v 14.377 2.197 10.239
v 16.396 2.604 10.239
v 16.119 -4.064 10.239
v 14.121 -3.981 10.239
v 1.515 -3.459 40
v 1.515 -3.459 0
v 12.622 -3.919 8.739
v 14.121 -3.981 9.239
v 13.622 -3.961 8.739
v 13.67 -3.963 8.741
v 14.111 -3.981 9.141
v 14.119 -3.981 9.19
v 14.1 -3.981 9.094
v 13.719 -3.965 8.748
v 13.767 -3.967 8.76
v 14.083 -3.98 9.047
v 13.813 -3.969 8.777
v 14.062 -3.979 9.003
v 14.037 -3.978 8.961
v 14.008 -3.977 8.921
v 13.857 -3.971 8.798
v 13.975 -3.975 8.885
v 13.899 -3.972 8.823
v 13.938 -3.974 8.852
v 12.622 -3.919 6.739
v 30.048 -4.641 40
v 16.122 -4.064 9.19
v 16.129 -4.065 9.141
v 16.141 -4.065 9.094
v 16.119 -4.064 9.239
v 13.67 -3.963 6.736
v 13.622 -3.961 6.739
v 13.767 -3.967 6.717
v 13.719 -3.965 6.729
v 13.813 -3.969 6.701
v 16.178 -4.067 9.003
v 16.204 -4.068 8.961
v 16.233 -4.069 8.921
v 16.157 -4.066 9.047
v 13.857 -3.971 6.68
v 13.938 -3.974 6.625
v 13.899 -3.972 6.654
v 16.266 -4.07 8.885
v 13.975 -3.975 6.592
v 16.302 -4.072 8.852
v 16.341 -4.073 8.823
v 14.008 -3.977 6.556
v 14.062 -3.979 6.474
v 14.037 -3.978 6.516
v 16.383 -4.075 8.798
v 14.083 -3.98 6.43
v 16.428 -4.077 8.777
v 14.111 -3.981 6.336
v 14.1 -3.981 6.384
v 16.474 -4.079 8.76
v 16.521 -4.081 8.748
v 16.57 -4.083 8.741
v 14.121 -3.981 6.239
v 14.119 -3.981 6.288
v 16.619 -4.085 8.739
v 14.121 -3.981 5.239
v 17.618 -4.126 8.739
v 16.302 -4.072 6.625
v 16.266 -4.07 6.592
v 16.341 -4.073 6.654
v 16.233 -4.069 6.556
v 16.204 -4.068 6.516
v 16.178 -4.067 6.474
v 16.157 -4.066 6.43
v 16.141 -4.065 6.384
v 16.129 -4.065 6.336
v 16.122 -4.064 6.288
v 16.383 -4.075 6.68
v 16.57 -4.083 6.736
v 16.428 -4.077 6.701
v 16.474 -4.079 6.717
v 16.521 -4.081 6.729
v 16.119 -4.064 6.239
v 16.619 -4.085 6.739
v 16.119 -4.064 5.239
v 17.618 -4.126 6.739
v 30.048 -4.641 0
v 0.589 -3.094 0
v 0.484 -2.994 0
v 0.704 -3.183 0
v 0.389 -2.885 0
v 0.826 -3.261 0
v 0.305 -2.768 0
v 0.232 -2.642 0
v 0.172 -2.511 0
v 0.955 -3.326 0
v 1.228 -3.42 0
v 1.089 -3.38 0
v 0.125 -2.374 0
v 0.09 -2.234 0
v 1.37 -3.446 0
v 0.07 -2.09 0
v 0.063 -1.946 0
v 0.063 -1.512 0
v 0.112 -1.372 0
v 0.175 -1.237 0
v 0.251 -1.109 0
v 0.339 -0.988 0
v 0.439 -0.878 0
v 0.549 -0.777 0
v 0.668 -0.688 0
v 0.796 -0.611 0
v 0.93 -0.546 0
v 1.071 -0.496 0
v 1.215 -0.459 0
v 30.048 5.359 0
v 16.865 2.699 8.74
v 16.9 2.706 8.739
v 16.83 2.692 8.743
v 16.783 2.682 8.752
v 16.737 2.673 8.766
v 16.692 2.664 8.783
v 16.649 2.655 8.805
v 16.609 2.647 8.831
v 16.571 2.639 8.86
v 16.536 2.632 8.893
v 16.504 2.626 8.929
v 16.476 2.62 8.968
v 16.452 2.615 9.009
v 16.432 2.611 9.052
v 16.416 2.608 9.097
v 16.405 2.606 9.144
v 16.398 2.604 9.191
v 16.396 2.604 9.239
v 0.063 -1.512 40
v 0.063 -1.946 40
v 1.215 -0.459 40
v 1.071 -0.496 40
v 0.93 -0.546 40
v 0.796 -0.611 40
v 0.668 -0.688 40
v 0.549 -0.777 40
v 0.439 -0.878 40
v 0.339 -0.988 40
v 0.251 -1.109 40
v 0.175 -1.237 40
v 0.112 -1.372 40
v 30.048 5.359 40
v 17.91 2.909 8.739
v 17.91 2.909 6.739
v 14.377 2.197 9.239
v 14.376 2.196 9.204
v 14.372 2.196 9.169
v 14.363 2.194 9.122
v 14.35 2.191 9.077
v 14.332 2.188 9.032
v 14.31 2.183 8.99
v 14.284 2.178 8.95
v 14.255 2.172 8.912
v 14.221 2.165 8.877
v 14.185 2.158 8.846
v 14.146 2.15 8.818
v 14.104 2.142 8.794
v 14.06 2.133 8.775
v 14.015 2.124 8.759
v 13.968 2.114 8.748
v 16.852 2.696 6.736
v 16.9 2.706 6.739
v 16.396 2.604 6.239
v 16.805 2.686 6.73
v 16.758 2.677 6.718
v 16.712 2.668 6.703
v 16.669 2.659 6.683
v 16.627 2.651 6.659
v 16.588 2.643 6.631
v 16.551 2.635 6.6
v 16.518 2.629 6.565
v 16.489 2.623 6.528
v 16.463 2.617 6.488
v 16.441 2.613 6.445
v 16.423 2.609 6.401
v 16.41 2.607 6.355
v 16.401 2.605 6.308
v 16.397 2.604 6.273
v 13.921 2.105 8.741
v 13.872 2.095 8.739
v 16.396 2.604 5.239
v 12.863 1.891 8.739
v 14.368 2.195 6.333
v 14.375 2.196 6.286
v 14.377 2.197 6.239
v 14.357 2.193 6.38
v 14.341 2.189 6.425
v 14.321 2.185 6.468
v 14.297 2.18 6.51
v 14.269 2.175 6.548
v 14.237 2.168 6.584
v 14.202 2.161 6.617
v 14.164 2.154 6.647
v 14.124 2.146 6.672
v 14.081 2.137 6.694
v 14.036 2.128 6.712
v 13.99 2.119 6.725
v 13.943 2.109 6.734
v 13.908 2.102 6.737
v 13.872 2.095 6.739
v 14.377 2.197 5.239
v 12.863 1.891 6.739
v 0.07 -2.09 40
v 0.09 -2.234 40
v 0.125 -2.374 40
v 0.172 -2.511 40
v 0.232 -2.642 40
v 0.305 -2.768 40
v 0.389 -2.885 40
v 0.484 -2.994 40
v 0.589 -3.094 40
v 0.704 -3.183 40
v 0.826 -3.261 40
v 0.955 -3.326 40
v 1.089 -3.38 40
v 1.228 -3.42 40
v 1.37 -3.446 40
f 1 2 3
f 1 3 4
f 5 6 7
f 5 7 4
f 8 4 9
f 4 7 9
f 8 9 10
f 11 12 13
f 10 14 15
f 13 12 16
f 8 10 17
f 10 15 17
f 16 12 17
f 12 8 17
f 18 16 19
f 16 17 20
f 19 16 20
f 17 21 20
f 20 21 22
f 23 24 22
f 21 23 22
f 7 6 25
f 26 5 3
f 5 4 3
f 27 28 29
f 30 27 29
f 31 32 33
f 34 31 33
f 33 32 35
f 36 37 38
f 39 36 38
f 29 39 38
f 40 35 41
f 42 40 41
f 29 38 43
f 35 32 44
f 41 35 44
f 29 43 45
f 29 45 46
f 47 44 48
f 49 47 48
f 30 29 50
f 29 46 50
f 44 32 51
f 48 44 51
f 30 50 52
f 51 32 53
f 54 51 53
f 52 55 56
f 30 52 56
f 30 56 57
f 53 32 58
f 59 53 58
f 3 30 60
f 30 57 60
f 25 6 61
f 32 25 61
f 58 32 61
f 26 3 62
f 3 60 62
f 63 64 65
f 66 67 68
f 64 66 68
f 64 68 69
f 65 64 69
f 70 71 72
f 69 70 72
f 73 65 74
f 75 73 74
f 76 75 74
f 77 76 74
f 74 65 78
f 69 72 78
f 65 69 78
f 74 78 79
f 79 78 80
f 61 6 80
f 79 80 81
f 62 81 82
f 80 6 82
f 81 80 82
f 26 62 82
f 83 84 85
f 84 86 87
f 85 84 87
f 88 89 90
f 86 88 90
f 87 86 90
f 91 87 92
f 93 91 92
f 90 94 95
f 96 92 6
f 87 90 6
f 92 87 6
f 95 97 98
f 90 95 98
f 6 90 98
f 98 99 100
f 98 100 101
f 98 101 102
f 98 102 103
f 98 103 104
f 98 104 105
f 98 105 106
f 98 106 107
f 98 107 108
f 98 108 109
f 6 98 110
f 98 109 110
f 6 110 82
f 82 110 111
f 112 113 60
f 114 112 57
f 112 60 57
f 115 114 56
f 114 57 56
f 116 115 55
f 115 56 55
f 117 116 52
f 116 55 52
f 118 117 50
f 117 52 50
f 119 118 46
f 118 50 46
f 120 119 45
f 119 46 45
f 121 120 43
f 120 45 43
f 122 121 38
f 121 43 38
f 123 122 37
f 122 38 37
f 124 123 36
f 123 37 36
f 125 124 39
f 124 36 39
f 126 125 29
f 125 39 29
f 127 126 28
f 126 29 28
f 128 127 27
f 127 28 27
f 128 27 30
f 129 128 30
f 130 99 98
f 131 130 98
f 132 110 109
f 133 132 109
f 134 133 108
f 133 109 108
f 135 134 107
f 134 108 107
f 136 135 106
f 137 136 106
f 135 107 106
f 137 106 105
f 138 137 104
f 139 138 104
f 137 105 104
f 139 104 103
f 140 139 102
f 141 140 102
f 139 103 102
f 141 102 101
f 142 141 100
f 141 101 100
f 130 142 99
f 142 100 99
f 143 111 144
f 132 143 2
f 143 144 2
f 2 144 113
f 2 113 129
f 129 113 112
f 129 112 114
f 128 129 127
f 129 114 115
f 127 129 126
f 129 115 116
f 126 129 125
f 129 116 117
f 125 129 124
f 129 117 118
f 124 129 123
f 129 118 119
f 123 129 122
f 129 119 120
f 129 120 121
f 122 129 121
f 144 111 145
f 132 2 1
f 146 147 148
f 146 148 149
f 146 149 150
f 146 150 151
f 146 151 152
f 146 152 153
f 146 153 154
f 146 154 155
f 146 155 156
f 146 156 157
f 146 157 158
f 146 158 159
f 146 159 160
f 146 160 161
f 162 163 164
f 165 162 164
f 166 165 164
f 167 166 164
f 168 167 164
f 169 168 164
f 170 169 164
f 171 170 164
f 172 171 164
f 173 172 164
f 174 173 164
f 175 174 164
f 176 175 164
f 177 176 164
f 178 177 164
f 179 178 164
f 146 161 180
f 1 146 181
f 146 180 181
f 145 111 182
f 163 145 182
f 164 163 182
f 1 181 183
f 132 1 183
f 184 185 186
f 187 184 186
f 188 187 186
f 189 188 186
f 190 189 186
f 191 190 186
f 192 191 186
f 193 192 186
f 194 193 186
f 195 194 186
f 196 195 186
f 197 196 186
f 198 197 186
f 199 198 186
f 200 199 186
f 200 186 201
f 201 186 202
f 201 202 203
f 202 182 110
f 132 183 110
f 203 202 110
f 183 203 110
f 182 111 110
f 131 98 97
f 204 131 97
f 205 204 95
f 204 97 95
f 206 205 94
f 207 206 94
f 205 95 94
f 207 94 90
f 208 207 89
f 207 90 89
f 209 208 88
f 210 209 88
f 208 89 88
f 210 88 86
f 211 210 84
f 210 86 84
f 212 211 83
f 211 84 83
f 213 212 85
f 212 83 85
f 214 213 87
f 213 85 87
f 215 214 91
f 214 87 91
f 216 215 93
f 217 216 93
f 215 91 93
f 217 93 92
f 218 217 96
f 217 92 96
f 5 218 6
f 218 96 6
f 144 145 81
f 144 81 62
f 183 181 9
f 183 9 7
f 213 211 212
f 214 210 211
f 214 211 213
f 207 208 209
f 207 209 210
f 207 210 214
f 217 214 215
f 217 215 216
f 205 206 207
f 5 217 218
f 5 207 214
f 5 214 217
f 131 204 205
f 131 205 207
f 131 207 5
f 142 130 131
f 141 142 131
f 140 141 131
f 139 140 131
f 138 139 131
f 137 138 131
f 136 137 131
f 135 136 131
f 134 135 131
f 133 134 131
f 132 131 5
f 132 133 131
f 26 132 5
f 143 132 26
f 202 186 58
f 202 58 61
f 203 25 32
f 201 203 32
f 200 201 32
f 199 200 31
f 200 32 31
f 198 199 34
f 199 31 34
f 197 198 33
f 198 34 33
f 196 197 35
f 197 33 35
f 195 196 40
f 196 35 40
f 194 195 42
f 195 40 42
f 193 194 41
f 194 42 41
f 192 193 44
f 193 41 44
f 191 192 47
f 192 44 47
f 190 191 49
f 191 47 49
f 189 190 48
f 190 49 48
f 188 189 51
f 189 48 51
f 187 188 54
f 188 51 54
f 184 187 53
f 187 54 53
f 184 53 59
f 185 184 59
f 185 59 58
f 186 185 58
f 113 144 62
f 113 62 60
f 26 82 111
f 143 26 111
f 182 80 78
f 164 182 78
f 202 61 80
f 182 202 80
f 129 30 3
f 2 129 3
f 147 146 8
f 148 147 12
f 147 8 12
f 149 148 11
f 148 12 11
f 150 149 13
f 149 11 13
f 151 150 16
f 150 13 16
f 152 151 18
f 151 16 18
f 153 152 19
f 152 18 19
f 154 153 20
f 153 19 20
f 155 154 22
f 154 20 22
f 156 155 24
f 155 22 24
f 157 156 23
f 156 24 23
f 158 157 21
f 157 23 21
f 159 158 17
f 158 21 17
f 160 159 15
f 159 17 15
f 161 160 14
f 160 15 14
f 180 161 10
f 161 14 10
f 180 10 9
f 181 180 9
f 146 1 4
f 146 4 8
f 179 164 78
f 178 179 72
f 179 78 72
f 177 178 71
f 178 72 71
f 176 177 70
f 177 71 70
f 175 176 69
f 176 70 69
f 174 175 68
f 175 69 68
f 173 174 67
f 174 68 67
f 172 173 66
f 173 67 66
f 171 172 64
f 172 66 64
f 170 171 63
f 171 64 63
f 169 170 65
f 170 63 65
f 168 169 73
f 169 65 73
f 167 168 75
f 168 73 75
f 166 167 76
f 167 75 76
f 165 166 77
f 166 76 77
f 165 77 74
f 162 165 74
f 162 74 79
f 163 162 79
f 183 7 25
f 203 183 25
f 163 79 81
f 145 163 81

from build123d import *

# Parameters (mm, degrees)
BOSS_EXTRUDE1_DEPTH = 40
CUT_EXTRUDE1_DEPTH  = 239


with BuildPart() as part:
    # Sketch1 → Boss-Extrude1 (new body)
    with BuildSketch(Plane.XY):
        with BuildLine():
            Line((30.047665389, 0), (30.047665389, 5.358567608))
            Line((30.047665389, 5.358567608), (1.215039634, -0.459096075))
            ThreePointArc((1.215039634, -0.459096075), (0.492690836, -0.825874412), (0.062707817, -1.512481095))
            Line((0.062707817, -1.512481095), (0.062707817, -1.945783899))
            ThreePointArc((0.062707817, -1.945783899), (0.484381365, -2.994370603), (1.514610899, -3.459096075))
            Line((1.514610899, -3.459096075), (30.047665389, -4.641432392))
            Line((30.047665389, -4.641432392), (30.047665389, 0))
        make_face()
    extrude(amount=BOSS_EXTRUDE1_DEPTH)

    # Sketch5 → Cut-Extrude1 (cut)
    with BuildSketch(Plane(origin=(-0.140494121, -3.390512784, 0), x_dir=(0.99914257391908, -0.04140189587876196, 0), z_dir=(-0.04140189587876195, -0.9991425739190799, 0))):
        with BuildLine():
            Line((16.27382087, 5.238645278), (16.27382087, 6.238645278))
            ThreePointArc((16.27382087, 6.238645278), (16.420267479, 6.592198669), (16.77382087, 6.738645278))
            Line((16.77382087, 6.738645278), (17.77382087, 6.738645278))
            Line((17.77382087, 6.738645278), (17.77382087, 7.738645278))
            Line((17.77382087, 7.738645278), (17.77382087, 8.738645278))
            Line((17.77382087, 8.738645278), (16.77382087, 8.738645278))
            ThreePointArc((16.77382087, 8.738645278), (16.420267479, 8.885091887), (16.27382087, 9.238645278))
            Line((16.27382087, 9.238645278), (16.27382087, 10.238645278))
            Line((16.27382087, 10.238645278), (14.27382087, 10.238645278))
            Line((14.27382087, 10.238645278), (14.27382087, 9.238645278))
            ThreePointArc((14.27382087, 9.238645278), (14.12737426, 8.885091887), (13.77382087, 8.738645278))
            Line((13.77382087, 8.738645278), (12.77382087, 8.738645278))
            Line((12.77382087, 8.738645278), (12.77382087, 6.738645278))
            Line((12.77382087, 6.738645278), (13.77382087, 6.738645278))
            ThreePointArc((13.77382087, 6.738645278), (14.12737426, 6.592198669), (14.27382087, 6.238645278))
            Line((14.27382087, 6.238645278), (14.27382087, 5.238645278))
            Line((14.27382087, 5.238645278), (15.27382087, 5.238645278))
            Line((15.27382087, 5.238645278), (16.27382087, 5.238645278))
        make_face()
    extrude(amount=-CUT_EXTRUDE1_DEPTH, mode=Mode.SUBTRACT)


solid = part.part
